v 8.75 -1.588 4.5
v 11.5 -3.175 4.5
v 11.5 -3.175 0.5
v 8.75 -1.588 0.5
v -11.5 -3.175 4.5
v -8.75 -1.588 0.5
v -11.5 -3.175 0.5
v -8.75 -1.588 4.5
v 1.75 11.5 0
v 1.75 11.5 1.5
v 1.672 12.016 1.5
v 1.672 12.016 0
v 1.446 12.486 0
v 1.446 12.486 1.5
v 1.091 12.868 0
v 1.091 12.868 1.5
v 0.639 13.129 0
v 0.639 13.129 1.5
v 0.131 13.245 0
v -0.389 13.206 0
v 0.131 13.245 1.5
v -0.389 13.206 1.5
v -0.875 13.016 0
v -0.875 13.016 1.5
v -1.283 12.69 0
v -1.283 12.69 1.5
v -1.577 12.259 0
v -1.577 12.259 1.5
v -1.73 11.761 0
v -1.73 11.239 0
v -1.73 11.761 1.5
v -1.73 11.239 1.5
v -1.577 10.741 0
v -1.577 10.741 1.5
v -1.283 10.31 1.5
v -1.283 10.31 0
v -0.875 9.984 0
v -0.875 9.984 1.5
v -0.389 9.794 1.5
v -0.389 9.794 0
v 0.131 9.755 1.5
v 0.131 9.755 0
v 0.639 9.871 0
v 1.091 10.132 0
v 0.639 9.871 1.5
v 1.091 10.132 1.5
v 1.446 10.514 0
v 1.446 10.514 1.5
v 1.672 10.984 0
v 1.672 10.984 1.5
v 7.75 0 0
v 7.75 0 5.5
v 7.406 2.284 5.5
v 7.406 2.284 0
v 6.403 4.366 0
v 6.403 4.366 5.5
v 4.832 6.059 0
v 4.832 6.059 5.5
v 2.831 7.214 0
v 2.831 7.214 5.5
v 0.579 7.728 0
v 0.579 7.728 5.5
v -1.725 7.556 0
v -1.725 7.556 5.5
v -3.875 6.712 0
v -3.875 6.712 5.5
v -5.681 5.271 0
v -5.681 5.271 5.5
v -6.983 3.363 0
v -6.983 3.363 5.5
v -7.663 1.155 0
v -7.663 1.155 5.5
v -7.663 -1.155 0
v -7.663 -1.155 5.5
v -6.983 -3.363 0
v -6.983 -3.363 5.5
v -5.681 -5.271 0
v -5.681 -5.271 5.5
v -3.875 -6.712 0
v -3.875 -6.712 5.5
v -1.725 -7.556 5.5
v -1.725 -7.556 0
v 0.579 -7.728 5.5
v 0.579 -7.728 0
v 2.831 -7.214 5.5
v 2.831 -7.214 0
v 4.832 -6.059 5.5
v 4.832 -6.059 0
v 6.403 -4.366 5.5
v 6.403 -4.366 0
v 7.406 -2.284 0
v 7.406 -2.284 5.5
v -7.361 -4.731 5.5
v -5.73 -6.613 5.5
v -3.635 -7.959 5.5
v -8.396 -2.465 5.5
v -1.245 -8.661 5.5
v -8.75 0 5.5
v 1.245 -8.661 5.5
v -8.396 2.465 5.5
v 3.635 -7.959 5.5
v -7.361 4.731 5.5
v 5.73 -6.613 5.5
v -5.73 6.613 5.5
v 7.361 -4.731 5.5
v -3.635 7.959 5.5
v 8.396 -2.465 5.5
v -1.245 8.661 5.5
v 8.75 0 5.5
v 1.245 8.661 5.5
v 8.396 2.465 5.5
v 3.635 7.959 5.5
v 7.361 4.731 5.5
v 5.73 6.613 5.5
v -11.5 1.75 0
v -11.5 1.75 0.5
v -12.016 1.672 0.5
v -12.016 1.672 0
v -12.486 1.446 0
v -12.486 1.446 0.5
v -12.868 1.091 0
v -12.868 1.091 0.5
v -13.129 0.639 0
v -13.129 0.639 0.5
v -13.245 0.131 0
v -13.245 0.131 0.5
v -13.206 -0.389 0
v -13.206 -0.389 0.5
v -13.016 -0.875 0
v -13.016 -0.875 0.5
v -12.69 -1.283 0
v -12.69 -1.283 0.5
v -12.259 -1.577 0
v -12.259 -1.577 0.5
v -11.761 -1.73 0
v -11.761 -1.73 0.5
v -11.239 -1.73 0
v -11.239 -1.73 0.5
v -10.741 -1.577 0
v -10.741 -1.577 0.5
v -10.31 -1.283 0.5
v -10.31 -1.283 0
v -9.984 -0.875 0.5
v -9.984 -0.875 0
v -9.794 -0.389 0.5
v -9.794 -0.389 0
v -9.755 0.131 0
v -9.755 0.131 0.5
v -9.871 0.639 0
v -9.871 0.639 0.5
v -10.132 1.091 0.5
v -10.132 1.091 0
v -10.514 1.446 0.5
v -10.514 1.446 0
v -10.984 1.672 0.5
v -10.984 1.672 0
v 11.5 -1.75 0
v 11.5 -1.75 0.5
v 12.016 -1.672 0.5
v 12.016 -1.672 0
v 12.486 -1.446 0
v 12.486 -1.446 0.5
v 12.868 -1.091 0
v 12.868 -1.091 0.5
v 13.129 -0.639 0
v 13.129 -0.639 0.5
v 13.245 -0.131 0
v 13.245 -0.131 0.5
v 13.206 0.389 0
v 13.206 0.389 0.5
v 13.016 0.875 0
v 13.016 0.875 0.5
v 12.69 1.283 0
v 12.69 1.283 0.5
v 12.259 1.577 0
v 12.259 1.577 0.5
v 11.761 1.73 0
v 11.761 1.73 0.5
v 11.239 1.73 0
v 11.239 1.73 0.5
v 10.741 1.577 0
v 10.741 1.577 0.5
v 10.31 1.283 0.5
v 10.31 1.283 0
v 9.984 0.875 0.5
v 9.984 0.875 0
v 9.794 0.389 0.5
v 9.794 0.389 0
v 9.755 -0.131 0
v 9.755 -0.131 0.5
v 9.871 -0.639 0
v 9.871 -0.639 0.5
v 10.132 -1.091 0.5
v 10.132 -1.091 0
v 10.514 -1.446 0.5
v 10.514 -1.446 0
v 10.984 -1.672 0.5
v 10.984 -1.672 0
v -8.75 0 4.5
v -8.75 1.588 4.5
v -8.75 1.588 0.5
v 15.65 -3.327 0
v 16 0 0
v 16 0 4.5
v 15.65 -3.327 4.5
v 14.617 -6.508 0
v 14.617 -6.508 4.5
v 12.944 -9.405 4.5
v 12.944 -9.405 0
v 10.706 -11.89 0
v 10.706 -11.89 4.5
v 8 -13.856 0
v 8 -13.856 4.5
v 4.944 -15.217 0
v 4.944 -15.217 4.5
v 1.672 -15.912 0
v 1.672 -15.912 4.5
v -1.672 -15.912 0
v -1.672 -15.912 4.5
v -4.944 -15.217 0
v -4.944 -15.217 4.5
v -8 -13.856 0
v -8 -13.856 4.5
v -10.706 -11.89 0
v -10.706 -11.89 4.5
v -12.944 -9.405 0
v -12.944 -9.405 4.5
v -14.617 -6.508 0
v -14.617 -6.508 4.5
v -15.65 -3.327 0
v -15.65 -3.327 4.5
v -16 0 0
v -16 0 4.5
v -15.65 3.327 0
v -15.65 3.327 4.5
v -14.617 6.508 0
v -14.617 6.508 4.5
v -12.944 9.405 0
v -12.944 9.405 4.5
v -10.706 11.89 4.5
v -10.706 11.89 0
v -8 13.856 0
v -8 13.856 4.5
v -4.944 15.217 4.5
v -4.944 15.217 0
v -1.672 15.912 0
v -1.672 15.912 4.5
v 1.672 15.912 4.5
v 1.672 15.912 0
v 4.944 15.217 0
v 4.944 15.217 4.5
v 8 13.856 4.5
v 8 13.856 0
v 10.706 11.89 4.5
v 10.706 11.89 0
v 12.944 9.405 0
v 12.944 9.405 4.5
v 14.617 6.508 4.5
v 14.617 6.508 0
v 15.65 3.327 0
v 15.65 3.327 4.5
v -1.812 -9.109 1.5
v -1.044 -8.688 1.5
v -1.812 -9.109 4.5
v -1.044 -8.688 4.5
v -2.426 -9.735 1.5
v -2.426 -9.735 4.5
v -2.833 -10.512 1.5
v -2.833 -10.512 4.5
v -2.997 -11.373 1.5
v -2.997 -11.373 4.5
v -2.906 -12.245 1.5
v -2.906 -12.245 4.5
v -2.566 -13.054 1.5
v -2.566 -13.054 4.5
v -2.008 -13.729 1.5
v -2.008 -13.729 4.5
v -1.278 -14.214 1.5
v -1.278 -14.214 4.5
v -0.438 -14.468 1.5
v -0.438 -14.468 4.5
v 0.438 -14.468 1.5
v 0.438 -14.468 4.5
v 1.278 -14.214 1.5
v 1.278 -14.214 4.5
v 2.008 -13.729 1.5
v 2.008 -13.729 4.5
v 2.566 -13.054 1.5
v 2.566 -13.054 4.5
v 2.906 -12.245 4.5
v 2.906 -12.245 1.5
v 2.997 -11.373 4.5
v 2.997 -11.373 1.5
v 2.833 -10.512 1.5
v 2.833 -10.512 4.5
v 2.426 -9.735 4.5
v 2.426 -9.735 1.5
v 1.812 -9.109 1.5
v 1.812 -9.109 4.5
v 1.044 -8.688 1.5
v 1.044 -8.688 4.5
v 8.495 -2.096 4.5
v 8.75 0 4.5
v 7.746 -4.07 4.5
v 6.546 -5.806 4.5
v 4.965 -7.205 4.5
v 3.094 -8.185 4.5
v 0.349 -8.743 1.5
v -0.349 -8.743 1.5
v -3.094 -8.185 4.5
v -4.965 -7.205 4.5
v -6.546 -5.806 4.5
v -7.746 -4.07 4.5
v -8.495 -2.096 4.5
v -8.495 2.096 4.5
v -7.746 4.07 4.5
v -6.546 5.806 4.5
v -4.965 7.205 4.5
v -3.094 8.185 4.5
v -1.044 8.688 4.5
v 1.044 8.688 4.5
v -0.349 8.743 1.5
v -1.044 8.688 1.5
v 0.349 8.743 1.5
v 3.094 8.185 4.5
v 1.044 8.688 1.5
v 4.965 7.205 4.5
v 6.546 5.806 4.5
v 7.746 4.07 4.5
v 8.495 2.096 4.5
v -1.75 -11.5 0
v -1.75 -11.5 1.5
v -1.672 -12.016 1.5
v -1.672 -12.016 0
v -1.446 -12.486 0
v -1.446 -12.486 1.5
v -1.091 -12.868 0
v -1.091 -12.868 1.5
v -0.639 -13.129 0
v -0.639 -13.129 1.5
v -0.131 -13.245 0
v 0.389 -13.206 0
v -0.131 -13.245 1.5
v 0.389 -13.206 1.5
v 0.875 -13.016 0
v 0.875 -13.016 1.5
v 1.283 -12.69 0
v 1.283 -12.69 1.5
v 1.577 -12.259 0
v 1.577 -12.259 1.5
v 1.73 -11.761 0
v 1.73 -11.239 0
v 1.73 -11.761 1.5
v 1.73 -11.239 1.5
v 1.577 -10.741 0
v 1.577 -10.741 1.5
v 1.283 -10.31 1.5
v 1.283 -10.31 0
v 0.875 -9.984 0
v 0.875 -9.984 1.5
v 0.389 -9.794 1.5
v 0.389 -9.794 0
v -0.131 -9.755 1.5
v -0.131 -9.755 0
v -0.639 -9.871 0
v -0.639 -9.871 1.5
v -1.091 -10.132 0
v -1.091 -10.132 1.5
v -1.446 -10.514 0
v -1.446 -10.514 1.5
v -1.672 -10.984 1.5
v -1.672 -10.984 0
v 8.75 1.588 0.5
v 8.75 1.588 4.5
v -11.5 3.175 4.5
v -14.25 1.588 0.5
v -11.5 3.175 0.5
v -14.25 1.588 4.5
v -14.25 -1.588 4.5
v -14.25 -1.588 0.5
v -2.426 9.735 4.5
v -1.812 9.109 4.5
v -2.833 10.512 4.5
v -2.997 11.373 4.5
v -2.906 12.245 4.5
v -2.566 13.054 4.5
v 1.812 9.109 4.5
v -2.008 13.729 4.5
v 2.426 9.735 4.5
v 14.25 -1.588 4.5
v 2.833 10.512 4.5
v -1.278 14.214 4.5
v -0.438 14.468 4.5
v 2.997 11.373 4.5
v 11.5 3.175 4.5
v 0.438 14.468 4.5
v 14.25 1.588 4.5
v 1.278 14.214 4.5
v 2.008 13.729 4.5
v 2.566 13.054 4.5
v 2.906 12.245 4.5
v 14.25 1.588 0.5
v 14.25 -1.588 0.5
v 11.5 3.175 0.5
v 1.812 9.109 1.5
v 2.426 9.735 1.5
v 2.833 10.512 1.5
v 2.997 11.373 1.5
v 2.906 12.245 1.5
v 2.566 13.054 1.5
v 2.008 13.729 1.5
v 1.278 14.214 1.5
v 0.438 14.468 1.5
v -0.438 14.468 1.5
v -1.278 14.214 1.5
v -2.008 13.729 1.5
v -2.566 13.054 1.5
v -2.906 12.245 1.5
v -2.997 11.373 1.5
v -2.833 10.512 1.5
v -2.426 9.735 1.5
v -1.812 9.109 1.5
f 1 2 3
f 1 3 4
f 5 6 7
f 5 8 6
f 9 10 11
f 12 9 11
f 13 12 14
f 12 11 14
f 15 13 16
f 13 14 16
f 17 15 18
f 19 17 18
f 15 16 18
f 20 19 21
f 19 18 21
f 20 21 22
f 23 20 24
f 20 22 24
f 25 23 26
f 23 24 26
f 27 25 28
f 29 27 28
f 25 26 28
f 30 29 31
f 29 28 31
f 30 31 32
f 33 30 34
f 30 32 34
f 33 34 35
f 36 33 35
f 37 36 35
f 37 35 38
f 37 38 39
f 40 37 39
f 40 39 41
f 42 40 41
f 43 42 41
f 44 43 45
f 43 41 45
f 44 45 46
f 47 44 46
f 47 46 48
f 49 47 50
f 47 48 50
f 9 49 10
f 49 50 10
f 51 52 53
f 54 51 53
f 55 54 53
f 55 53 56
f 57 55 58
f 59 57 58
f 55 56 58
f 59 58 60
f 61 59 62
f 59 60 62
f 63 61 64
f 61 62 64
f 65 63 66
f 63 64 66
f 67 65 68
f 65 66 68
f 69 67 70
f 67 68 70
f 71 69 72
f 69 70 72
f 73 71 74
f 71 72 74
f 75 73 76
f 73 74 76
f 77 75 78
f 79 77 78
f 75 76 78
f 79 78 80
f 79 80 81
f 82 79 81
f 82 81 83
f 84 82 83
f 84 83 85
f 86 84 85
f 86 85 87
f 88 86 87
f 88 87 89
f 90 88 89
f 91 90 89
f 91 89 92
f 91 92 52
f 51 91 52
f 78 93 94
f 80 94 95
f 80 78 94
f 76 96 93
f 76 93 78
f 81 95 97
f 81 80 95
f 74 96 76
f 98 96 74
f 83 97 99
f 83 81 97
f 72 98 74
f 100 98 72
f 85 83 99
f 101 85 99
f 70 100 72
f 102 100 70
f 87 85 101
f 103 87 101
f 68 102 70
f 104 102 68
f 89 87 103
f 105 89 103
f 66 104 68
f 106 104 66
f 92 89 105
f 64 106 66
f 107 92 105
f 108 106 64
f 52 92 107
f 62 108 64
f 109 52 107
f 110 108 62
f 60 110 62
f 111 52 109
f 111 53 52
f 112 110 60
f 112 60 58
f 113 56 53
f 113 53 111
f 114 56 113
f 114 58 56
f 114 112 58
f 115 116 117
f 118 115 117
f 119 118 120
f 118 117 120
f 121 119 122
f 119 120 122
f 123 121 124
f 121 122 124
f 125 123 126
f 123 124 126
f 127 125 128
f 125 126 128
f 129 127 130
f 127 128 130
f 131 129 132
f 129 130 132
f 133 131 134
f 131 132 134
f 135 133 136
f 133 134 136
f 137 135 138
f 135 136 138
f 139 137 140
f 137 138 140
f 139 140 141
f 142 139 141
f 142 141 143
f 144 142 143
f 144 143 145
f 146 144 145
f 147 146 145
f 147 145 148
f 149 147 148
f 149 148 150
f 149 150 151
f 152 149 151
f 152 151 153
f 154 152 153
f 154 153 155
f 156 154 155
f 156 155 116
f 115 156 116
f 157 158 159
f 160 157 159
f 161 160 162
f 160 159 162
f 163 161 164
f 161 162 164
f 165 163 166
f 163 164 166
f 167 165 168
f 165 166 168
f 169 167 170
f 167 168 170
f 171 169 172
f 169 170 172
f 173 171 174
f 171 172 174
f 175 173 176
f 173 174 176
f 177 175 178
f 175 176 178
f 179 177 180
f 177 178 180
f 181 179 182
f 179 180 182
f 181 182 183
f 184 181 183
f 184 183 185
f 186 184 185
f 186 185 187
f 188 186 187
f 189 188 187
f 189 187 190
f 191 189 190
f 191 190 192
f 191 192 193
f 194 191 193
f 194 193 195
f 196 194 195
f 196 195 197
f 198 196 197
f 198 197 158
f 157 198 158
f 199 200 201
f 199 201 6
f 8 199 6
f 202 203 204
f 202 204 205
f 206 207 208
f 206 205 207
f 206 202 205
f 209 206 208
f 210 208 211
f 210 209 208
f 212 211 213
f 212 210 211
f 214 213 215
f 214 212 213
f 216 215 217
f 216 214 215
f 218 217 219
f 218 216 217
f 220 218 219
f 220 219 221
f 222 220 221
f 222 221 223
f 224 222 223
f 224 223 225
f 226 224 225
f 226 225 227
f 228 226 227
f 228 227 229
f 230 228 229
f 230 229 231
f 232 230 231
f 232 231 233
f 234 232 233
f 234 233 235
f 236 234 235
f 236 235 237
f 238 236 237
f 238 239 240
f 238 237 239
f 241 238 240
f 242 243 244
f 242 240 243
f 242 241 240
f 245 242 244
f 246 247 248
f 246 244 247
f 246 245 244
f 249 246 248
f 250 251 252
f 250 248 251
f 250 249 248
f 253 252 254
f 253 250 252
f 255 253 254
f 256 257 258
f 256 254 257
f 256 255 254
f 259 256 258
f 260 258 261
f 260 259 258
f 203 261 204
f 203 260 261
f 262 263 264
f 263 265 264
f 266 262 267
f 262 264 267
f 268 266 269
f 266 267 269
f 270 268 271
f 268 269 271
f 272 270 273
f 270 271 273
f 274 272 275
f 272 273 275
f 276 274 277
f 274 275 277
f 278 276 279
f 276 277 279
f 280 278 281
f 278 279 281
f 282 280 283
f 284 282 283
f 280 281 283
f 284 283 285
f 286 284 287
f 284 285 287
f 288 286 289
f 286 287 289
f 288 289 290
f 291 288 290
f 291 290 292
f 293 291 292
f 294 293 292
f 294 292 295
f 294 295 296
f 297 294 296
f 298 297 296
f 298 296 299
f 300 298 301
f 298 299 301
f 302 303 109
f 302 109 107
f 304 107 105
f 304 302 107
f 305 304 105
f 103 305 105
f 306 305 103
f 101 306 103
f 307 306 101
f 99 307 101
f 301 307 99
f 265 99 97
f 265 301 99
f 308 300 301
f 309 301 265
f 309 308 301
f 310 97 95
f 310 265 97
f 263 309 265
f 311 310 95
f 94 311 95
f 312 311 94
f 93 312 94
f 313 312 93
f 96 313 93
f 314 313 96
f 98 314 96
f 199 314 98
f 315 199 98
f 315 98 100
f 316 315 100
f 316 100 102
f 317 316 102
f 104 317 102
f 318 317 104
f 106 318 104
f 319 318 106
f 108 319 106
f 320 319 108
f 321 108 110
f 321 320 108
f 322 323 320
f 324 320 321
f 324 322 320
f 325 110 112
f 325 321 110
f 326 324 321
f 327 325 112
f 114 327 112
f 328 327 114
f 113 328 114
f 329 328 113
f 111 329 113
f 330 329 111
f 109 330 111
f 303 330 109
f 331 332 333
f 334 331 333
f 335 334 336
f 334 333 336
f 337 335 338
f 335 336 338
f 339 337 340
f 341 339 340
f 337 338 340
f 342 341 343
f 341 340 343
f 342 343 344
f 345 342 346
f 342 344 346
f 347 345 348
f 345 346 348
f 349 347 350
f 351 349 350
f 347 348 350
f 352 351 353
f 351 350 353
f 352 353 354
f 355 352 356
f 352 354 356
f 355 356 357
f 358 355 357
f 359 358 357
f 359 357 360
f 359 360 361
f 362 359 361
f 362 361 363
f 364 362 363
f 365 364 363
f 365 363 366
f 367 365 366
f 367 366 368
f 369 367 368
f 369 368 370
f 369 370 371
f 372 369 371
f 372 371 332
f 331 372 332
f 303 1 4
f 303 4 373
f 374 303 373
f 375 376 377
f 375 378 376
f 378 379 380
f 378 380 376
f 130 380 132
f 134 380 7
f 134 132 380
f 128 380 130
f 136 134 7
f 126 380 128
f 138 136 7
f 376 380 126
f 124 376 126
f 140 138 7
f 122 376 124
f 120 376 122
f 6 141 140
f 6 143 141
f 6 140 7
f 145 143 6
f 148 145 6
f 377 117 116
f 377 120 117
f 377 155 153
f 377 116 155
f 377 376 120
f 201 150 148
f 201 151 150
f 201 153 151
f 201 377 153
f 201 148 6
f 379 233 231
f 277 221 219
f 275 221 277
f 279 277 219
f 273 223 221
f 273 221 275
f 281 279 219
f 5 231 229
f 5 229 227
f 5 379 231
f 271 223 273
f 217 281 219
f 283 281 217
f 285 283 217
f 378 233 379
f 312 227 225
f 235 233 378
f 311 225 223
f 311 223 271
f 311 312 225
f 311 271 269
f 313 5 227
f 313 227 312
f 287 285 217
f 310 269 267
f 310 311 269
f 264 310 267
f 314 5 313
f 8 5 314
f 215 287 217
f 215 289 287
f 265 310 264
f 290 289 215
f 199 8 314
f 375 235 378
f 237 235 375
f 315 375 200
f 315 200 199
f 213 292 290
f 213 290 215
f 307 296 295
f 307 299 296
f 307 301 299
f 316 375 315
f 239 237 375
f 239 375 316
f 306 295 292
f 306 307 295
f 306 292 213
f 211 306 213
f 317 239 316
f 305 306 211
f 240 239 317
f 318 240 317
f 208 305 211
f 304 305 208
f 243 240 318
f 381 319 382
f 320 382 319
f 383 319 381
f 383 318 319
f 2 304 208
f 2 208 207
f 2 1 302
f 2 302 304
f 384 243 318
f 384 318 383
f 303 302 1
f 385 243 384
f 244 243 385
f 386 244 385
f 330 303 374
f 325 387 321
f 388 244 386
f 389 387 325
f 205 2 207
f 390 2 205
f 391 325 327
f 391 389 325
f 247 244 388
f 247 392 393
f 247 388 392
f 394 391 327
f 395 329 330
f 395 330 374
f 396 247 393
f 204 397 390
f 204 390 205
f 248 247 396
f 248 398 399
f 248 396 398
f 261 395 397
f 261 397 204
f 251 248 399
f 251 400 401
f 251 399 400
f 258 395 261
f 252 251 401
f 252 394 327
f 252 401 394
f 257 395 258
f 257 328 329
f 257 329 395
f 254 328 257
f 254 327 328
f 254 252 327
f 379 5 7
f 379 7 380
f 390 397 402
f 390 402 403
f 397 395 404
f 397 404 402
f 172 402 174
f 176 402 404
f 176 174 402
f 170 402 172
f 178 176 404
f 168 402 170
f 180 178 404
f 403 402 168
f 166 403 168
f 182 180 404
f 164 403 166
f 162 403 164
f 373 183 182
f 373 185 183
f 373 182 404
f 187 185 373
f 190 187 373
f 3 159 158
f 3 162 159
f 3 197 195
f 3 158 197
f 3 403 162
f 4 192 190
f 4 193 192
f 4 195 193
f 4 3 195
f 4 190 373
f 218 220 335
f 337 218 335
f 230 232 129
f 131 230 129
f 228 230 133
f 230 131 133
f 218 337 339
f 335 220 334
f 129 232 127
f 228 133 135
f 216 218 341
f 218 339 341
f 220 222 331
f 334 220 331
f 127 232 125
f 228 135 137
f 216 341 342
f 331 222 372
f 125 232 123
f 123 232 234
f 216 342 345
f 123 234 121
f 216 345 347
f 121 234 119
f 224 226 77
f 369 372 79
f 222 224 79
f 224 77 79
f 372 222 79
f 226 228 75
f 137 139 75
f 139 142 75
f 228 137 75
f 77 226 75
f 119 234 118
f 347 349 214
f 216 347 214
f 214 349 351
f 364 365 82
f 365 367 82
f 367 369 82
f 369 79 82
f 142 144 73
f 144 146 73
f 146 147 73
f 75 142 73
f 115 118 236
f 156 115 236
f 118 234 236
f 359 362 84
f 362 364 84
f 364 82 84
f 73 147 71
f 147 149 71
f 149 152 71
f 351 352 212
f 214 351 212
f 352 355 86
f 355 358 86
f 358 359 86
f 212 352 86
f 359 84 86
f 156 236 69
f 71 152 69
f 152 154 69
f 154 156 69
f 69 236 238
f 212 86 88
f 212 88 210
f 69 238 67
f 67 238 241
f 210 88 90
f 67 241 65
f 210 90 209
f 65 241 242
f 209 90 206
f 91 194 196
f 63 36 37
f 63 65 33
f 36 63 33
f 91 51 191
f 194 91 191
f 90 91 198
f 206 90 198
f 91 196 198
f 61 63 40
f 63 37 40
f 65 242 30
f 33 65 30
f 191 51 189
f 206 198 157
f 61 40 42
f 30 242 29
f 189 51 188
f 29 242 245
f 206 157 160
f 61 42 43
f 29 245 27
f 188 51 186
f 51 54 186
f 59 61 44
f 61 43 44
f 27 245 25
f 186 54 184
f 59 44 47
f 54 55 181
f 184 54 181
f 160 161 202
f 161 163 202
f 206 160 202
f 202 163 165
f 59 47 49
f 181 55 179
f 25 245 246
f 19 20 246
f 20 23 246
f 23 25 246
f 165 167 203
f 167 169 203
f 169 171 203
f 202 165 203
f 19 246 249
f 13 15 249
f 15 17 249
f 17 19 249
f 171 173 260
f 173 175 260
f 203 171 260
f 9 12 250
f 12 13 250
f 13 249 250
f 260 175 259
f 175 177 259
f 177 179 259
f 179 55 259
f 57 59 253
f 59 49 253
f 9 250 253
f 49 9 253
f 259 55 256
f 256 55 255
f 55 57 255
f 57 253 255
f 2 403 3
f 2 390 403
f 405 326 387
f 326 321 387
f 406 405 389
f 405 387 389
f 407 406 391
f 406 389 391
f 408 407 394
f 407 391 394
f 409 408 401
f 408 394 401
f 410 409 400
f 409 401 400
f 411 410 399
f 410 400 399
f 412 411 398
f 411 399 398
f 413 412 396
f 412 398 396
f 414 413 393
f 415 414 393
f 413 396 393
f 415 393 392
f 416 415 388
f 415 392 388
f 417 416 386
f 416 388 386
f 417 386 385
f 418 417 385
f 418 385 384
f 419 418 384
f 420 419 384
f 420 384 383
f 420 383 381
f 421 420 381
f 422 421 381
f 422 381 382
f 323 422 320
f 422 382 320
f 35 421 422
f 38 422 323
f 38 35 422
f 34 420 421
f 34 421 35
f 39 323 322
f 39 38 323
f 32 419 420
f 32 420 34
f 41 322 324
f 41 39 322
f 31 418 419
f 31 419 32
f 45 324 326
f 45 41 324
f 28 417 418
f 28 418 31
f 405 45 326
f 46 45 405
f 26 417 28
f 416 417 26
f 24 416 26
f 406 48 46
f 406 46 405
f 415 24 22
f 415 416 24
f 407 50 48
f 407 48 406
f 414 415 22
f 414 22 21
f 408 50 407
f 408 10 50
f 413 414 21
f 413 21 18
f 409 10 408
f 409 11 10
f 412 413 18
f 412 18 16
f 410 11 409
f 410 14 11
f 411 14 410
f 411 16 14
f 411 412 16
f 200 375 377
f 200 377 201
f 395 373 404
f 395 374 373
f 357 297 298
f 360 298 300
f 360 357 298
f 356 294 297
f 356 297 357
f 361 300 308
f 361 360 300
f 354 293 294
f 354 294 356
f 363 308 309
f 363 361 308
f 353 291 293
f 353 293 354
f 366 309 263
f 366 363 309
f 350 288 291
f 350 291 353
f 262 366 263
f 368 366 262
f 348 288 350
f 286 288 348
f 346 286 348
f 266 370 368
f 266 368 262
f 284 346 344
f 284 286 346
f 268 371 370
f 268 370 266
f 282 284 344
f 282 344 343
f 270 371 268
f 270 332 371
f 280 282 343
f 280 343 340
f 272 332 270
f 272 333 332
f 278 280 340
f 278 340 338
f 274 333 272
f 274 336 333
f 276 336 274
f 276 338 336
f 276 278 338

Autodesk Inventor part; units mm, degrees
ref_plane "YZ Plane" through (0, 0, 0) normal (1, 0, 0) x (0, 1, 0)
ref_plane "XZ Plane" through (0, 0, 0) normal (0, 1, 0) x (-1, 0, 0)
ref_plane "XY Plane" through (0, 0, 0) normal (0, 0, 1) x (1, 0, 0)
sketch "Sketch1" plane through (0, 0, 0) normal (0, 0, 1) x (1, 0, 0)
  circle A0 centre (0, 0) radius 16
  dimension "d0" = 32
extrude "Extrusion1" add sketch "Sketch1" along normal blind 4.5
sketch "Sketch2" plane through (0, 0, 4.5) normal (0, 0, 1) x (1, 0, 0)
  circle A0 centre (0, 0) radius 16 projected
  circle A1 centre (0, 0) radius 8.75
  dimension "d5" = 17.5
extrude "Extrusion2" add sketch "Sketch2" along normal blind 1 contours A1
sketch "Sketch3" plane through (0, 0, 5.5) normal (0, 0, 1) x (1, 0, 0)
  circle A0 centre (0, 0) radius 8.75 projected
  circle A1 centre (0, 0) radius 7.75
  dimension "d10" = 15.5
extrude "Extrusion3" cut sketch "Sketch3" against normal through all contours A1
sketch "Sketch4" plane through (0, 0, 4.5) normal (0, 0, 1) x (1, 0, 0)
  circle A0 centre (0, 0) radius 8.75 projected
  circle A1 centre (0, 11.5) radius 1.75
  dimension "d15" = 11.5
  dimension "d16" = 3.5
extrude "Extrusion4" cut sketch "Sketch4" against normal through all contours A1
pattern_circular "Circular Pattern1" count 4 over 360 about axis through (0, 0, 0) along (0, 0, 1) of "Extrusion4"
sketch "Sketch5" plane through (0, 0, 4.5) normal (0, 0, 1) x (1, 0, 0)
  circle A0 centre (0, 11.5) radius 1.75 projected
  circle A1 centre (0, 0) radius 8.75 projected
  arc A2 (1.044, 8.6875) -> (-1.044, 8.6875) centre (0, 11.5) ccw
  dimension "d22" = 6
extrude "Extrusion5" cut sketch "Sketch5" against normal blind 3 contours A1 A2
sketch "Sketch6" plane through (0, 0, 4.5) normal (0, 0, 1) x (1, 0, 0)
  circle A0 centre (-11.5, 0) radius 1.75 projected
  line L0 (-11.5, 3.1754) -> (-8.75, 1.5877)
  line L1 (-8.75, 1.5877) -> (-8.75, -1.5877)
  line L2 (-8.75, -1.5877) -> (-11.5, -3.1754)
  line L3 (-11.5, -3.1754) -> (-14.25, -1.5877)
  line L4 (-14.25, -1.5877) -> (-14.25, 1.5877)
  line L5 (-14.25, 1.5877) -> (-11.5, 3.1754)
  dimension "d28" = 5.5
extrude "Extrusion6" cut sketch "Sketch6" against normal blind 4
pattern_circular "Circular Pattern2" count 2 over 360 about axis through (0, 0, 0) along (0, 0, 1) of "Extrusion6", "Extrusion5"
properties part number "bearing seat 1"
